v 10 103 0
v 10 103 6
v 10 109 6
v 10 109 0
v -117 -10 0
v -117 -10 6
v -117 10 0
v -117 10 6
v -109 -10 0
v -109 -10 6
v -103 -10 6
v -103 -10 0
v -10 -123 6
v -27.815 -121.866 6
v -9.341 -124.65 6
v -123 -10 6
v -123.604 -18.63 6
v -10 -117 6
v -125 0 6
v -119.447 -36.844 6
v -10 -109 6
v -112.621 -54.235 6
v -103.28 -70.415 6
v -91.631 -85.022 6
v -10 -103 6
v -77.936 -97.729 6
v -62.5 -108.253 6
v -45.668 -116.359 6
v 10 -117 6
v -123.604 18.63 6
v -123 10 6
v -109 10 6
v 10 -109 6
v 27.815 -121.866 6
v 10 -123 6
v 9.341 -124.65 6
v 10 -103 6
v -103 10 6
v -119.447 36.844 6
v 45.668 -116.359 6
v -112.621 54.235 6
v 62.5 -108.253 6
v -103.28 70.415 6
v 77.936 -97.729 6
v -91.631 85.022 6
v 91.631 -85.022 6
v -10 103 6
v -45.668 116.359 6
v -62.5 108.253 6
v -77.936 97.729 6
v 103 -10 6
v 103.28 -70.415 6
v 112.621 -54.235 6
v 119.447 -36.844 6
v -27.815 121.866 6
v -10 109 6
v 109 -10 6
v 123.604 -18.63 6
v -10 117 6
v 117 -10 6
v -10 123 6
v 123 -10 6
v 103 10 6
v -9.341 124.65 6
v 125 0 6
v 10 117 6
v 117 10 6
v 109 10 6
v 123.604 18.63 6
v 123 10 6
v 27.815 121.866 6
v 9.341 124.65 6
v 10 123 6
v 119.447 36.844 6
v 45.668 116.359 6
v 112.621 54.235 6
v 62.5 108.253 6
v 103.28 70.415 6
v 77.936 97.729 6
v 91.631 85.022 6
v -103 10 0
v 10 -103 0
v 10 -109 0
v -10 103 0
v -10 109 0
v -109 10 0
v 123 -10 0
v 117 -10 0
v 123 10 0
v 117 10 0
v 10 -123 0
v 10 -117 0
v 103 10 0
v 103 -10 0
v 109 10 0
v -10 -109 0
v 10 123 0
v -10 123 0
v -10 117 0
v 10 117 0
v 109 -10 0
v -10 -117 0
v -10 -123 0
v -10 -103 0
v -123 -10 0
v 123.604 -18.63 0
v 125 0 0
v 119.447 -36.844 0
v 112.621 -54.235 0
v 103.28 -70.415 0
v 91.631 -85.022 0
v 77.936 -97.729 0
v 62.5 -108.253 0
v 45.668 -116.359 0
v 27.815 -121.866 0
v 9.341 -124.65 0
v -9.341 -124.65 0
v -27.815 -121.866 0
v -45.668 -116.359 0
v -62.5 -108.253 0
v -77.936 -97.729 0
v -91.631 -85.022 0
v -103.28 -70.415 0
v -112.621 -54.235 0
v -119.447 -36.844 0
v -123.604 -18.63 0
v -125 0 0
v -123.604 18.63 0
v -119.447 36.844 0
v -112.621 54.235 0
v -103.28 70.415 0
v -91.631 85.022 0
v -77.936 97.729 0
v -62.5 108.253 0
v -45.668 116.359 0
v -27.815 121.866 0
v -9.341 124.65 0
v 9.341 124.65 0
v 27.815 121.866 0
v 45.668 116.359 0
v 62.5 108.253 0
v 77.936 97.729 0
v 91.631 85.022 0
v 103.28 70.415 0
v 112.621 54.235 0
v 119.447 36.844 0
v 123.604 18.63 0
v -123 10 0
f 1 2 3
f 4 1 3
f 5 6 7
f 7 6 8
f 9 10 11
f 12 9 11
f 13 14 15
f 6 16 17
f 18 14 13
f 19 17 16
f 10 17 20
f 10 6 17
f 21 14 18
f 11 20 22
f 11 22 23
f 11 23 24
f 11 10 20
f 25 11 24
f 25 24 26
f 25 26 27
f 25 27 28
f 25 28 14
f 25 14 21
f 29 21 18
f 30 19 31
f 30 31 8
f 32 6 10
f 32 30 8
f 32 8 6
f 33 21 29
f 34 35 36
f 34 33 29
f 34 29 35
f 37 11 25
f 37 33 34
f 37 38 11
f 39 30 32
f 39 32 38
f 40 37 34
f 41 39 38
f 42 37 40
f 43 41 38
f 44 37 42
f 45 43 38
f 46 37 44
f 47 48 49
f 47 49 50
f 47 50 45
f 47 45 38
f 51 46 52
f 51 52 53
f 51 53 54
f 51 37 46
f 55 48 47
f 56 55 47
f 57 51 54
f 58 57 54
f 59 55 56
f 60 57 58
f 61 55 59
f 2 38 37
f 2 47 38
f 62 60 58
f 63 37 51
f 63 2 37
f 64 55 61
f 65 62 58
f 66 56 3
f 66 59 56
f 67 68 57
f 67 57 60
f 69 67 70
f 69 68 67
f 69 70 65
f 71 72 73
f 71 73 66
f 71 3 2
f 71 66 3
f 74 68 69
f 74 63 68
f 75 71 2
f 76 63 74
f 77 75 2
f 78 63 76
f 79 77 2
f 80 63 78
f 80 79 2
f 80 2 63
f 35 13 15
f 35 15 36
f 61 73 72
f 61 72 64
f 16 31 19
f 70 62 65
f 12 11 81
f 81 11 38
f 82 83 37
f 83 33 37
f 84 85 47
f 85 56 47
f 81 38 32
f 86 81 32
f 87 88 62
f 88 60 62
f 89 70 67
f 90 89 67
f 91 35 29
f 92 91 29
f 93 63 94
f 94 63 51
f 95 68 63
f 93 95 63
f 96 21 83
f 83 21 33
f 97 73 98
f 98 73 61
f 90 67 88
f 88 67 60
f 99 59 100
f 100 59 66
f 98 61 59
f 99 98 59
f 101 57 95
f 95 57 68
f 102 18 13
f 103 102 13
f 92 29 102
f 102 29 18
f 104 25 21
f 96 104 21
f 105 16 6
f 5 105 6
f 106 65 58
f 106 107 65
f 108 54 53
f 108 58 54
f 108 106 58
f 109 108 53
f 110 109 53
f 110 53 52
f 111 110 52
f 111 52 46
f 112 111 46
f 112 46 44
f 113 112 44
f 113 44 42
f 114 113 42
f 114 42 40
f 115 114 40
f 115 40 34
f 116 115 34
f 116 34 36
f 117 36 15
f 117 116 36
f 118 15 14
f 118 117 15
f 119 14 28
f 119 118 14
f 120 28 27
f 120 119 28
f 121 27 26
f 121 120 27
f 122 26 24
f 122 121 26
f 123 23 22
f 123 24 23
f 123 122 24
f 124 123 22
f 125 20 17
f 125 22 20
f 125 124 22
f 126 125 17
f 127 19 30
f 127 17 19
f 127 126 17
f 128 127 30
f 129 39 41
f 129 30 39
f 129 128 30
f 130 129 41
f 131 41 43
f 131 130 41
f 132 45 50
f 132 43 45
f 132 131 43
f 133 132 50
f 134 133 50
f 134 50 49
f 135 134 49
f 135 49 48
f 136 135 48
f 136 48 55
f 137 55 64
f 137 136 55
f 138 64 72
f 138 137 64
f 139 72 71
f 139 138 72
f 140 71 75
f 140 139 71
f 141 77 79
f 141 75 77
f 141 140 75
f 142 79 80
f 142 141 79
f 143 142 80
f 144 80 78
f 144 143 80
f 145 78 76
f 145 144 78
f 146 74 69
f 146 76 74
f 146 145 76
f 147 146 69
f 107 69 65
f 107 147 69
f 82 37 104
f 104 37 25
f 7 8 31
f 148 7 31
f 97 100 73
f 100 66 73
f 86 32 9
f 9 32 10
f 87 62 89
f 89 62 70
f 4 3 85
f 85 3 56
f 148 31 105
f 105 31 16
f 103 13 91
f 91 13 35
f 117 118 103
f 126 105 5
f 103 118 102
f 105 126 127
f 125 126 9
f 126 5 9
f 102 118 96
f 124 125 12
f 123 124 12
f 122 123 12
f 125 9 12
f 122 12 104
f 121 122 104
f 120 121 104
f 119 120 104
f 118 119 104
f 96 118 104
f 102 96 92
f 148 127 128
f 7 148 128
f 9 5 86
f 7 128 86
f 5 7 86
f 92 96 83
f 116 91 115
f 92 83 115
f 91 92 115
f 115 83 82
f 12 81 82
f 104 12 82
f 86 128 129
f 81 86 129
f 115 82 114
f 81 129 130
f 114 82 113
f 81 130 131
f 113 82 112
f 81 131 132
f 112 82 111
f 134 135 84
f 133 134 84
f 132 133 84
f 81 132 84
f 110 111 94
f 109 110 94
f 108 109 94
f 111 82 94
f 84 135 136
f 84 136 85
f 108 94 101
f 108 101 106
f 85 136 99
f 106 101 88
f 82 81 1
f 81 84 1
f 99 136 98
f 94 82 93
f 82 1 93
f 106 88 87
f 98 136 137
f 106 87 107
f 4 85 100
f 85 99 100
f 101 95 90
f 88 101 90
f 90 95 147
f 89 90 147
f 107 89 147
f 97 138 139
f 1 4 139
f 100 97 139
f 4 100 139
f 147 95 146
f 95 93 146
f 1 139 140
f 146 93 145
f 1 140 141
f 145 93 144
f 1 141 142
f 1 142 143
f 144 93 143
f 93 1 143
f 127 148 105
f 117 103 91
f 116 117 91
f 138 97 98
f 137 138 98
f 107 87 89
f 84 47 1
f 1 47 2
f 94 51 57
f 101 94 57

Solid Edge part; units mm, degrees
sketch "Sketch1" plane through (0, 0, 0) normal (0, 0, 1) x (1, 0, 0)
  circle A0 centre (0, 0) radius 125
  dimension "D1" = 250
extrude "Protrusion1" add sketch "Sketch1" along normal blind 6
sketch "Sketch2" plane through (3.3435, -13.8996, 6) normal (0, 0, 1) x (1, 0, 0)
  line L0 (-13.3435, 116.8996) -> (6.6565, 116.8996)
  line L1 (6.6565, 116.8996) -> (6.6565, 122.8996)
  line L2 (6.6565, 122.8996) -> (-13.3435, 122.8996)
  line L3 (-13.3435, 122.8996) -> (-13.3435, 116.8996)
  dimension "D1" = 103
  dimension "D2" = 10
extrude "Cutout1" cut sketch "Sketch2" against normal through all
sketch "Sketch3" plane through (0.433, -2.3524, 6) normal (0, 0, 1) x (1, 0, 0)
  line L0 (-10.433, 119.3524) -> (9.567, 119.3524)
  line L1 (9.567, 119.3524) -> (9.567, 125.3524)
  line L2 (9.567, 125.3524) -> (-10.433, 125.3524)
  line L3 (-10.433, 125.3524) -> (-10.433, 119.3524)
  dimension "D1" = 117
extrude "Cutout2" cut sketch "Sketch3" against normal through all
pattern_circular "Pattern1" count 4 over 360 about axis through (0, 0, 6) along (0, 0, -1) of "Cutout2", "Cutout1"
properties material "Wood, Mahogany"
